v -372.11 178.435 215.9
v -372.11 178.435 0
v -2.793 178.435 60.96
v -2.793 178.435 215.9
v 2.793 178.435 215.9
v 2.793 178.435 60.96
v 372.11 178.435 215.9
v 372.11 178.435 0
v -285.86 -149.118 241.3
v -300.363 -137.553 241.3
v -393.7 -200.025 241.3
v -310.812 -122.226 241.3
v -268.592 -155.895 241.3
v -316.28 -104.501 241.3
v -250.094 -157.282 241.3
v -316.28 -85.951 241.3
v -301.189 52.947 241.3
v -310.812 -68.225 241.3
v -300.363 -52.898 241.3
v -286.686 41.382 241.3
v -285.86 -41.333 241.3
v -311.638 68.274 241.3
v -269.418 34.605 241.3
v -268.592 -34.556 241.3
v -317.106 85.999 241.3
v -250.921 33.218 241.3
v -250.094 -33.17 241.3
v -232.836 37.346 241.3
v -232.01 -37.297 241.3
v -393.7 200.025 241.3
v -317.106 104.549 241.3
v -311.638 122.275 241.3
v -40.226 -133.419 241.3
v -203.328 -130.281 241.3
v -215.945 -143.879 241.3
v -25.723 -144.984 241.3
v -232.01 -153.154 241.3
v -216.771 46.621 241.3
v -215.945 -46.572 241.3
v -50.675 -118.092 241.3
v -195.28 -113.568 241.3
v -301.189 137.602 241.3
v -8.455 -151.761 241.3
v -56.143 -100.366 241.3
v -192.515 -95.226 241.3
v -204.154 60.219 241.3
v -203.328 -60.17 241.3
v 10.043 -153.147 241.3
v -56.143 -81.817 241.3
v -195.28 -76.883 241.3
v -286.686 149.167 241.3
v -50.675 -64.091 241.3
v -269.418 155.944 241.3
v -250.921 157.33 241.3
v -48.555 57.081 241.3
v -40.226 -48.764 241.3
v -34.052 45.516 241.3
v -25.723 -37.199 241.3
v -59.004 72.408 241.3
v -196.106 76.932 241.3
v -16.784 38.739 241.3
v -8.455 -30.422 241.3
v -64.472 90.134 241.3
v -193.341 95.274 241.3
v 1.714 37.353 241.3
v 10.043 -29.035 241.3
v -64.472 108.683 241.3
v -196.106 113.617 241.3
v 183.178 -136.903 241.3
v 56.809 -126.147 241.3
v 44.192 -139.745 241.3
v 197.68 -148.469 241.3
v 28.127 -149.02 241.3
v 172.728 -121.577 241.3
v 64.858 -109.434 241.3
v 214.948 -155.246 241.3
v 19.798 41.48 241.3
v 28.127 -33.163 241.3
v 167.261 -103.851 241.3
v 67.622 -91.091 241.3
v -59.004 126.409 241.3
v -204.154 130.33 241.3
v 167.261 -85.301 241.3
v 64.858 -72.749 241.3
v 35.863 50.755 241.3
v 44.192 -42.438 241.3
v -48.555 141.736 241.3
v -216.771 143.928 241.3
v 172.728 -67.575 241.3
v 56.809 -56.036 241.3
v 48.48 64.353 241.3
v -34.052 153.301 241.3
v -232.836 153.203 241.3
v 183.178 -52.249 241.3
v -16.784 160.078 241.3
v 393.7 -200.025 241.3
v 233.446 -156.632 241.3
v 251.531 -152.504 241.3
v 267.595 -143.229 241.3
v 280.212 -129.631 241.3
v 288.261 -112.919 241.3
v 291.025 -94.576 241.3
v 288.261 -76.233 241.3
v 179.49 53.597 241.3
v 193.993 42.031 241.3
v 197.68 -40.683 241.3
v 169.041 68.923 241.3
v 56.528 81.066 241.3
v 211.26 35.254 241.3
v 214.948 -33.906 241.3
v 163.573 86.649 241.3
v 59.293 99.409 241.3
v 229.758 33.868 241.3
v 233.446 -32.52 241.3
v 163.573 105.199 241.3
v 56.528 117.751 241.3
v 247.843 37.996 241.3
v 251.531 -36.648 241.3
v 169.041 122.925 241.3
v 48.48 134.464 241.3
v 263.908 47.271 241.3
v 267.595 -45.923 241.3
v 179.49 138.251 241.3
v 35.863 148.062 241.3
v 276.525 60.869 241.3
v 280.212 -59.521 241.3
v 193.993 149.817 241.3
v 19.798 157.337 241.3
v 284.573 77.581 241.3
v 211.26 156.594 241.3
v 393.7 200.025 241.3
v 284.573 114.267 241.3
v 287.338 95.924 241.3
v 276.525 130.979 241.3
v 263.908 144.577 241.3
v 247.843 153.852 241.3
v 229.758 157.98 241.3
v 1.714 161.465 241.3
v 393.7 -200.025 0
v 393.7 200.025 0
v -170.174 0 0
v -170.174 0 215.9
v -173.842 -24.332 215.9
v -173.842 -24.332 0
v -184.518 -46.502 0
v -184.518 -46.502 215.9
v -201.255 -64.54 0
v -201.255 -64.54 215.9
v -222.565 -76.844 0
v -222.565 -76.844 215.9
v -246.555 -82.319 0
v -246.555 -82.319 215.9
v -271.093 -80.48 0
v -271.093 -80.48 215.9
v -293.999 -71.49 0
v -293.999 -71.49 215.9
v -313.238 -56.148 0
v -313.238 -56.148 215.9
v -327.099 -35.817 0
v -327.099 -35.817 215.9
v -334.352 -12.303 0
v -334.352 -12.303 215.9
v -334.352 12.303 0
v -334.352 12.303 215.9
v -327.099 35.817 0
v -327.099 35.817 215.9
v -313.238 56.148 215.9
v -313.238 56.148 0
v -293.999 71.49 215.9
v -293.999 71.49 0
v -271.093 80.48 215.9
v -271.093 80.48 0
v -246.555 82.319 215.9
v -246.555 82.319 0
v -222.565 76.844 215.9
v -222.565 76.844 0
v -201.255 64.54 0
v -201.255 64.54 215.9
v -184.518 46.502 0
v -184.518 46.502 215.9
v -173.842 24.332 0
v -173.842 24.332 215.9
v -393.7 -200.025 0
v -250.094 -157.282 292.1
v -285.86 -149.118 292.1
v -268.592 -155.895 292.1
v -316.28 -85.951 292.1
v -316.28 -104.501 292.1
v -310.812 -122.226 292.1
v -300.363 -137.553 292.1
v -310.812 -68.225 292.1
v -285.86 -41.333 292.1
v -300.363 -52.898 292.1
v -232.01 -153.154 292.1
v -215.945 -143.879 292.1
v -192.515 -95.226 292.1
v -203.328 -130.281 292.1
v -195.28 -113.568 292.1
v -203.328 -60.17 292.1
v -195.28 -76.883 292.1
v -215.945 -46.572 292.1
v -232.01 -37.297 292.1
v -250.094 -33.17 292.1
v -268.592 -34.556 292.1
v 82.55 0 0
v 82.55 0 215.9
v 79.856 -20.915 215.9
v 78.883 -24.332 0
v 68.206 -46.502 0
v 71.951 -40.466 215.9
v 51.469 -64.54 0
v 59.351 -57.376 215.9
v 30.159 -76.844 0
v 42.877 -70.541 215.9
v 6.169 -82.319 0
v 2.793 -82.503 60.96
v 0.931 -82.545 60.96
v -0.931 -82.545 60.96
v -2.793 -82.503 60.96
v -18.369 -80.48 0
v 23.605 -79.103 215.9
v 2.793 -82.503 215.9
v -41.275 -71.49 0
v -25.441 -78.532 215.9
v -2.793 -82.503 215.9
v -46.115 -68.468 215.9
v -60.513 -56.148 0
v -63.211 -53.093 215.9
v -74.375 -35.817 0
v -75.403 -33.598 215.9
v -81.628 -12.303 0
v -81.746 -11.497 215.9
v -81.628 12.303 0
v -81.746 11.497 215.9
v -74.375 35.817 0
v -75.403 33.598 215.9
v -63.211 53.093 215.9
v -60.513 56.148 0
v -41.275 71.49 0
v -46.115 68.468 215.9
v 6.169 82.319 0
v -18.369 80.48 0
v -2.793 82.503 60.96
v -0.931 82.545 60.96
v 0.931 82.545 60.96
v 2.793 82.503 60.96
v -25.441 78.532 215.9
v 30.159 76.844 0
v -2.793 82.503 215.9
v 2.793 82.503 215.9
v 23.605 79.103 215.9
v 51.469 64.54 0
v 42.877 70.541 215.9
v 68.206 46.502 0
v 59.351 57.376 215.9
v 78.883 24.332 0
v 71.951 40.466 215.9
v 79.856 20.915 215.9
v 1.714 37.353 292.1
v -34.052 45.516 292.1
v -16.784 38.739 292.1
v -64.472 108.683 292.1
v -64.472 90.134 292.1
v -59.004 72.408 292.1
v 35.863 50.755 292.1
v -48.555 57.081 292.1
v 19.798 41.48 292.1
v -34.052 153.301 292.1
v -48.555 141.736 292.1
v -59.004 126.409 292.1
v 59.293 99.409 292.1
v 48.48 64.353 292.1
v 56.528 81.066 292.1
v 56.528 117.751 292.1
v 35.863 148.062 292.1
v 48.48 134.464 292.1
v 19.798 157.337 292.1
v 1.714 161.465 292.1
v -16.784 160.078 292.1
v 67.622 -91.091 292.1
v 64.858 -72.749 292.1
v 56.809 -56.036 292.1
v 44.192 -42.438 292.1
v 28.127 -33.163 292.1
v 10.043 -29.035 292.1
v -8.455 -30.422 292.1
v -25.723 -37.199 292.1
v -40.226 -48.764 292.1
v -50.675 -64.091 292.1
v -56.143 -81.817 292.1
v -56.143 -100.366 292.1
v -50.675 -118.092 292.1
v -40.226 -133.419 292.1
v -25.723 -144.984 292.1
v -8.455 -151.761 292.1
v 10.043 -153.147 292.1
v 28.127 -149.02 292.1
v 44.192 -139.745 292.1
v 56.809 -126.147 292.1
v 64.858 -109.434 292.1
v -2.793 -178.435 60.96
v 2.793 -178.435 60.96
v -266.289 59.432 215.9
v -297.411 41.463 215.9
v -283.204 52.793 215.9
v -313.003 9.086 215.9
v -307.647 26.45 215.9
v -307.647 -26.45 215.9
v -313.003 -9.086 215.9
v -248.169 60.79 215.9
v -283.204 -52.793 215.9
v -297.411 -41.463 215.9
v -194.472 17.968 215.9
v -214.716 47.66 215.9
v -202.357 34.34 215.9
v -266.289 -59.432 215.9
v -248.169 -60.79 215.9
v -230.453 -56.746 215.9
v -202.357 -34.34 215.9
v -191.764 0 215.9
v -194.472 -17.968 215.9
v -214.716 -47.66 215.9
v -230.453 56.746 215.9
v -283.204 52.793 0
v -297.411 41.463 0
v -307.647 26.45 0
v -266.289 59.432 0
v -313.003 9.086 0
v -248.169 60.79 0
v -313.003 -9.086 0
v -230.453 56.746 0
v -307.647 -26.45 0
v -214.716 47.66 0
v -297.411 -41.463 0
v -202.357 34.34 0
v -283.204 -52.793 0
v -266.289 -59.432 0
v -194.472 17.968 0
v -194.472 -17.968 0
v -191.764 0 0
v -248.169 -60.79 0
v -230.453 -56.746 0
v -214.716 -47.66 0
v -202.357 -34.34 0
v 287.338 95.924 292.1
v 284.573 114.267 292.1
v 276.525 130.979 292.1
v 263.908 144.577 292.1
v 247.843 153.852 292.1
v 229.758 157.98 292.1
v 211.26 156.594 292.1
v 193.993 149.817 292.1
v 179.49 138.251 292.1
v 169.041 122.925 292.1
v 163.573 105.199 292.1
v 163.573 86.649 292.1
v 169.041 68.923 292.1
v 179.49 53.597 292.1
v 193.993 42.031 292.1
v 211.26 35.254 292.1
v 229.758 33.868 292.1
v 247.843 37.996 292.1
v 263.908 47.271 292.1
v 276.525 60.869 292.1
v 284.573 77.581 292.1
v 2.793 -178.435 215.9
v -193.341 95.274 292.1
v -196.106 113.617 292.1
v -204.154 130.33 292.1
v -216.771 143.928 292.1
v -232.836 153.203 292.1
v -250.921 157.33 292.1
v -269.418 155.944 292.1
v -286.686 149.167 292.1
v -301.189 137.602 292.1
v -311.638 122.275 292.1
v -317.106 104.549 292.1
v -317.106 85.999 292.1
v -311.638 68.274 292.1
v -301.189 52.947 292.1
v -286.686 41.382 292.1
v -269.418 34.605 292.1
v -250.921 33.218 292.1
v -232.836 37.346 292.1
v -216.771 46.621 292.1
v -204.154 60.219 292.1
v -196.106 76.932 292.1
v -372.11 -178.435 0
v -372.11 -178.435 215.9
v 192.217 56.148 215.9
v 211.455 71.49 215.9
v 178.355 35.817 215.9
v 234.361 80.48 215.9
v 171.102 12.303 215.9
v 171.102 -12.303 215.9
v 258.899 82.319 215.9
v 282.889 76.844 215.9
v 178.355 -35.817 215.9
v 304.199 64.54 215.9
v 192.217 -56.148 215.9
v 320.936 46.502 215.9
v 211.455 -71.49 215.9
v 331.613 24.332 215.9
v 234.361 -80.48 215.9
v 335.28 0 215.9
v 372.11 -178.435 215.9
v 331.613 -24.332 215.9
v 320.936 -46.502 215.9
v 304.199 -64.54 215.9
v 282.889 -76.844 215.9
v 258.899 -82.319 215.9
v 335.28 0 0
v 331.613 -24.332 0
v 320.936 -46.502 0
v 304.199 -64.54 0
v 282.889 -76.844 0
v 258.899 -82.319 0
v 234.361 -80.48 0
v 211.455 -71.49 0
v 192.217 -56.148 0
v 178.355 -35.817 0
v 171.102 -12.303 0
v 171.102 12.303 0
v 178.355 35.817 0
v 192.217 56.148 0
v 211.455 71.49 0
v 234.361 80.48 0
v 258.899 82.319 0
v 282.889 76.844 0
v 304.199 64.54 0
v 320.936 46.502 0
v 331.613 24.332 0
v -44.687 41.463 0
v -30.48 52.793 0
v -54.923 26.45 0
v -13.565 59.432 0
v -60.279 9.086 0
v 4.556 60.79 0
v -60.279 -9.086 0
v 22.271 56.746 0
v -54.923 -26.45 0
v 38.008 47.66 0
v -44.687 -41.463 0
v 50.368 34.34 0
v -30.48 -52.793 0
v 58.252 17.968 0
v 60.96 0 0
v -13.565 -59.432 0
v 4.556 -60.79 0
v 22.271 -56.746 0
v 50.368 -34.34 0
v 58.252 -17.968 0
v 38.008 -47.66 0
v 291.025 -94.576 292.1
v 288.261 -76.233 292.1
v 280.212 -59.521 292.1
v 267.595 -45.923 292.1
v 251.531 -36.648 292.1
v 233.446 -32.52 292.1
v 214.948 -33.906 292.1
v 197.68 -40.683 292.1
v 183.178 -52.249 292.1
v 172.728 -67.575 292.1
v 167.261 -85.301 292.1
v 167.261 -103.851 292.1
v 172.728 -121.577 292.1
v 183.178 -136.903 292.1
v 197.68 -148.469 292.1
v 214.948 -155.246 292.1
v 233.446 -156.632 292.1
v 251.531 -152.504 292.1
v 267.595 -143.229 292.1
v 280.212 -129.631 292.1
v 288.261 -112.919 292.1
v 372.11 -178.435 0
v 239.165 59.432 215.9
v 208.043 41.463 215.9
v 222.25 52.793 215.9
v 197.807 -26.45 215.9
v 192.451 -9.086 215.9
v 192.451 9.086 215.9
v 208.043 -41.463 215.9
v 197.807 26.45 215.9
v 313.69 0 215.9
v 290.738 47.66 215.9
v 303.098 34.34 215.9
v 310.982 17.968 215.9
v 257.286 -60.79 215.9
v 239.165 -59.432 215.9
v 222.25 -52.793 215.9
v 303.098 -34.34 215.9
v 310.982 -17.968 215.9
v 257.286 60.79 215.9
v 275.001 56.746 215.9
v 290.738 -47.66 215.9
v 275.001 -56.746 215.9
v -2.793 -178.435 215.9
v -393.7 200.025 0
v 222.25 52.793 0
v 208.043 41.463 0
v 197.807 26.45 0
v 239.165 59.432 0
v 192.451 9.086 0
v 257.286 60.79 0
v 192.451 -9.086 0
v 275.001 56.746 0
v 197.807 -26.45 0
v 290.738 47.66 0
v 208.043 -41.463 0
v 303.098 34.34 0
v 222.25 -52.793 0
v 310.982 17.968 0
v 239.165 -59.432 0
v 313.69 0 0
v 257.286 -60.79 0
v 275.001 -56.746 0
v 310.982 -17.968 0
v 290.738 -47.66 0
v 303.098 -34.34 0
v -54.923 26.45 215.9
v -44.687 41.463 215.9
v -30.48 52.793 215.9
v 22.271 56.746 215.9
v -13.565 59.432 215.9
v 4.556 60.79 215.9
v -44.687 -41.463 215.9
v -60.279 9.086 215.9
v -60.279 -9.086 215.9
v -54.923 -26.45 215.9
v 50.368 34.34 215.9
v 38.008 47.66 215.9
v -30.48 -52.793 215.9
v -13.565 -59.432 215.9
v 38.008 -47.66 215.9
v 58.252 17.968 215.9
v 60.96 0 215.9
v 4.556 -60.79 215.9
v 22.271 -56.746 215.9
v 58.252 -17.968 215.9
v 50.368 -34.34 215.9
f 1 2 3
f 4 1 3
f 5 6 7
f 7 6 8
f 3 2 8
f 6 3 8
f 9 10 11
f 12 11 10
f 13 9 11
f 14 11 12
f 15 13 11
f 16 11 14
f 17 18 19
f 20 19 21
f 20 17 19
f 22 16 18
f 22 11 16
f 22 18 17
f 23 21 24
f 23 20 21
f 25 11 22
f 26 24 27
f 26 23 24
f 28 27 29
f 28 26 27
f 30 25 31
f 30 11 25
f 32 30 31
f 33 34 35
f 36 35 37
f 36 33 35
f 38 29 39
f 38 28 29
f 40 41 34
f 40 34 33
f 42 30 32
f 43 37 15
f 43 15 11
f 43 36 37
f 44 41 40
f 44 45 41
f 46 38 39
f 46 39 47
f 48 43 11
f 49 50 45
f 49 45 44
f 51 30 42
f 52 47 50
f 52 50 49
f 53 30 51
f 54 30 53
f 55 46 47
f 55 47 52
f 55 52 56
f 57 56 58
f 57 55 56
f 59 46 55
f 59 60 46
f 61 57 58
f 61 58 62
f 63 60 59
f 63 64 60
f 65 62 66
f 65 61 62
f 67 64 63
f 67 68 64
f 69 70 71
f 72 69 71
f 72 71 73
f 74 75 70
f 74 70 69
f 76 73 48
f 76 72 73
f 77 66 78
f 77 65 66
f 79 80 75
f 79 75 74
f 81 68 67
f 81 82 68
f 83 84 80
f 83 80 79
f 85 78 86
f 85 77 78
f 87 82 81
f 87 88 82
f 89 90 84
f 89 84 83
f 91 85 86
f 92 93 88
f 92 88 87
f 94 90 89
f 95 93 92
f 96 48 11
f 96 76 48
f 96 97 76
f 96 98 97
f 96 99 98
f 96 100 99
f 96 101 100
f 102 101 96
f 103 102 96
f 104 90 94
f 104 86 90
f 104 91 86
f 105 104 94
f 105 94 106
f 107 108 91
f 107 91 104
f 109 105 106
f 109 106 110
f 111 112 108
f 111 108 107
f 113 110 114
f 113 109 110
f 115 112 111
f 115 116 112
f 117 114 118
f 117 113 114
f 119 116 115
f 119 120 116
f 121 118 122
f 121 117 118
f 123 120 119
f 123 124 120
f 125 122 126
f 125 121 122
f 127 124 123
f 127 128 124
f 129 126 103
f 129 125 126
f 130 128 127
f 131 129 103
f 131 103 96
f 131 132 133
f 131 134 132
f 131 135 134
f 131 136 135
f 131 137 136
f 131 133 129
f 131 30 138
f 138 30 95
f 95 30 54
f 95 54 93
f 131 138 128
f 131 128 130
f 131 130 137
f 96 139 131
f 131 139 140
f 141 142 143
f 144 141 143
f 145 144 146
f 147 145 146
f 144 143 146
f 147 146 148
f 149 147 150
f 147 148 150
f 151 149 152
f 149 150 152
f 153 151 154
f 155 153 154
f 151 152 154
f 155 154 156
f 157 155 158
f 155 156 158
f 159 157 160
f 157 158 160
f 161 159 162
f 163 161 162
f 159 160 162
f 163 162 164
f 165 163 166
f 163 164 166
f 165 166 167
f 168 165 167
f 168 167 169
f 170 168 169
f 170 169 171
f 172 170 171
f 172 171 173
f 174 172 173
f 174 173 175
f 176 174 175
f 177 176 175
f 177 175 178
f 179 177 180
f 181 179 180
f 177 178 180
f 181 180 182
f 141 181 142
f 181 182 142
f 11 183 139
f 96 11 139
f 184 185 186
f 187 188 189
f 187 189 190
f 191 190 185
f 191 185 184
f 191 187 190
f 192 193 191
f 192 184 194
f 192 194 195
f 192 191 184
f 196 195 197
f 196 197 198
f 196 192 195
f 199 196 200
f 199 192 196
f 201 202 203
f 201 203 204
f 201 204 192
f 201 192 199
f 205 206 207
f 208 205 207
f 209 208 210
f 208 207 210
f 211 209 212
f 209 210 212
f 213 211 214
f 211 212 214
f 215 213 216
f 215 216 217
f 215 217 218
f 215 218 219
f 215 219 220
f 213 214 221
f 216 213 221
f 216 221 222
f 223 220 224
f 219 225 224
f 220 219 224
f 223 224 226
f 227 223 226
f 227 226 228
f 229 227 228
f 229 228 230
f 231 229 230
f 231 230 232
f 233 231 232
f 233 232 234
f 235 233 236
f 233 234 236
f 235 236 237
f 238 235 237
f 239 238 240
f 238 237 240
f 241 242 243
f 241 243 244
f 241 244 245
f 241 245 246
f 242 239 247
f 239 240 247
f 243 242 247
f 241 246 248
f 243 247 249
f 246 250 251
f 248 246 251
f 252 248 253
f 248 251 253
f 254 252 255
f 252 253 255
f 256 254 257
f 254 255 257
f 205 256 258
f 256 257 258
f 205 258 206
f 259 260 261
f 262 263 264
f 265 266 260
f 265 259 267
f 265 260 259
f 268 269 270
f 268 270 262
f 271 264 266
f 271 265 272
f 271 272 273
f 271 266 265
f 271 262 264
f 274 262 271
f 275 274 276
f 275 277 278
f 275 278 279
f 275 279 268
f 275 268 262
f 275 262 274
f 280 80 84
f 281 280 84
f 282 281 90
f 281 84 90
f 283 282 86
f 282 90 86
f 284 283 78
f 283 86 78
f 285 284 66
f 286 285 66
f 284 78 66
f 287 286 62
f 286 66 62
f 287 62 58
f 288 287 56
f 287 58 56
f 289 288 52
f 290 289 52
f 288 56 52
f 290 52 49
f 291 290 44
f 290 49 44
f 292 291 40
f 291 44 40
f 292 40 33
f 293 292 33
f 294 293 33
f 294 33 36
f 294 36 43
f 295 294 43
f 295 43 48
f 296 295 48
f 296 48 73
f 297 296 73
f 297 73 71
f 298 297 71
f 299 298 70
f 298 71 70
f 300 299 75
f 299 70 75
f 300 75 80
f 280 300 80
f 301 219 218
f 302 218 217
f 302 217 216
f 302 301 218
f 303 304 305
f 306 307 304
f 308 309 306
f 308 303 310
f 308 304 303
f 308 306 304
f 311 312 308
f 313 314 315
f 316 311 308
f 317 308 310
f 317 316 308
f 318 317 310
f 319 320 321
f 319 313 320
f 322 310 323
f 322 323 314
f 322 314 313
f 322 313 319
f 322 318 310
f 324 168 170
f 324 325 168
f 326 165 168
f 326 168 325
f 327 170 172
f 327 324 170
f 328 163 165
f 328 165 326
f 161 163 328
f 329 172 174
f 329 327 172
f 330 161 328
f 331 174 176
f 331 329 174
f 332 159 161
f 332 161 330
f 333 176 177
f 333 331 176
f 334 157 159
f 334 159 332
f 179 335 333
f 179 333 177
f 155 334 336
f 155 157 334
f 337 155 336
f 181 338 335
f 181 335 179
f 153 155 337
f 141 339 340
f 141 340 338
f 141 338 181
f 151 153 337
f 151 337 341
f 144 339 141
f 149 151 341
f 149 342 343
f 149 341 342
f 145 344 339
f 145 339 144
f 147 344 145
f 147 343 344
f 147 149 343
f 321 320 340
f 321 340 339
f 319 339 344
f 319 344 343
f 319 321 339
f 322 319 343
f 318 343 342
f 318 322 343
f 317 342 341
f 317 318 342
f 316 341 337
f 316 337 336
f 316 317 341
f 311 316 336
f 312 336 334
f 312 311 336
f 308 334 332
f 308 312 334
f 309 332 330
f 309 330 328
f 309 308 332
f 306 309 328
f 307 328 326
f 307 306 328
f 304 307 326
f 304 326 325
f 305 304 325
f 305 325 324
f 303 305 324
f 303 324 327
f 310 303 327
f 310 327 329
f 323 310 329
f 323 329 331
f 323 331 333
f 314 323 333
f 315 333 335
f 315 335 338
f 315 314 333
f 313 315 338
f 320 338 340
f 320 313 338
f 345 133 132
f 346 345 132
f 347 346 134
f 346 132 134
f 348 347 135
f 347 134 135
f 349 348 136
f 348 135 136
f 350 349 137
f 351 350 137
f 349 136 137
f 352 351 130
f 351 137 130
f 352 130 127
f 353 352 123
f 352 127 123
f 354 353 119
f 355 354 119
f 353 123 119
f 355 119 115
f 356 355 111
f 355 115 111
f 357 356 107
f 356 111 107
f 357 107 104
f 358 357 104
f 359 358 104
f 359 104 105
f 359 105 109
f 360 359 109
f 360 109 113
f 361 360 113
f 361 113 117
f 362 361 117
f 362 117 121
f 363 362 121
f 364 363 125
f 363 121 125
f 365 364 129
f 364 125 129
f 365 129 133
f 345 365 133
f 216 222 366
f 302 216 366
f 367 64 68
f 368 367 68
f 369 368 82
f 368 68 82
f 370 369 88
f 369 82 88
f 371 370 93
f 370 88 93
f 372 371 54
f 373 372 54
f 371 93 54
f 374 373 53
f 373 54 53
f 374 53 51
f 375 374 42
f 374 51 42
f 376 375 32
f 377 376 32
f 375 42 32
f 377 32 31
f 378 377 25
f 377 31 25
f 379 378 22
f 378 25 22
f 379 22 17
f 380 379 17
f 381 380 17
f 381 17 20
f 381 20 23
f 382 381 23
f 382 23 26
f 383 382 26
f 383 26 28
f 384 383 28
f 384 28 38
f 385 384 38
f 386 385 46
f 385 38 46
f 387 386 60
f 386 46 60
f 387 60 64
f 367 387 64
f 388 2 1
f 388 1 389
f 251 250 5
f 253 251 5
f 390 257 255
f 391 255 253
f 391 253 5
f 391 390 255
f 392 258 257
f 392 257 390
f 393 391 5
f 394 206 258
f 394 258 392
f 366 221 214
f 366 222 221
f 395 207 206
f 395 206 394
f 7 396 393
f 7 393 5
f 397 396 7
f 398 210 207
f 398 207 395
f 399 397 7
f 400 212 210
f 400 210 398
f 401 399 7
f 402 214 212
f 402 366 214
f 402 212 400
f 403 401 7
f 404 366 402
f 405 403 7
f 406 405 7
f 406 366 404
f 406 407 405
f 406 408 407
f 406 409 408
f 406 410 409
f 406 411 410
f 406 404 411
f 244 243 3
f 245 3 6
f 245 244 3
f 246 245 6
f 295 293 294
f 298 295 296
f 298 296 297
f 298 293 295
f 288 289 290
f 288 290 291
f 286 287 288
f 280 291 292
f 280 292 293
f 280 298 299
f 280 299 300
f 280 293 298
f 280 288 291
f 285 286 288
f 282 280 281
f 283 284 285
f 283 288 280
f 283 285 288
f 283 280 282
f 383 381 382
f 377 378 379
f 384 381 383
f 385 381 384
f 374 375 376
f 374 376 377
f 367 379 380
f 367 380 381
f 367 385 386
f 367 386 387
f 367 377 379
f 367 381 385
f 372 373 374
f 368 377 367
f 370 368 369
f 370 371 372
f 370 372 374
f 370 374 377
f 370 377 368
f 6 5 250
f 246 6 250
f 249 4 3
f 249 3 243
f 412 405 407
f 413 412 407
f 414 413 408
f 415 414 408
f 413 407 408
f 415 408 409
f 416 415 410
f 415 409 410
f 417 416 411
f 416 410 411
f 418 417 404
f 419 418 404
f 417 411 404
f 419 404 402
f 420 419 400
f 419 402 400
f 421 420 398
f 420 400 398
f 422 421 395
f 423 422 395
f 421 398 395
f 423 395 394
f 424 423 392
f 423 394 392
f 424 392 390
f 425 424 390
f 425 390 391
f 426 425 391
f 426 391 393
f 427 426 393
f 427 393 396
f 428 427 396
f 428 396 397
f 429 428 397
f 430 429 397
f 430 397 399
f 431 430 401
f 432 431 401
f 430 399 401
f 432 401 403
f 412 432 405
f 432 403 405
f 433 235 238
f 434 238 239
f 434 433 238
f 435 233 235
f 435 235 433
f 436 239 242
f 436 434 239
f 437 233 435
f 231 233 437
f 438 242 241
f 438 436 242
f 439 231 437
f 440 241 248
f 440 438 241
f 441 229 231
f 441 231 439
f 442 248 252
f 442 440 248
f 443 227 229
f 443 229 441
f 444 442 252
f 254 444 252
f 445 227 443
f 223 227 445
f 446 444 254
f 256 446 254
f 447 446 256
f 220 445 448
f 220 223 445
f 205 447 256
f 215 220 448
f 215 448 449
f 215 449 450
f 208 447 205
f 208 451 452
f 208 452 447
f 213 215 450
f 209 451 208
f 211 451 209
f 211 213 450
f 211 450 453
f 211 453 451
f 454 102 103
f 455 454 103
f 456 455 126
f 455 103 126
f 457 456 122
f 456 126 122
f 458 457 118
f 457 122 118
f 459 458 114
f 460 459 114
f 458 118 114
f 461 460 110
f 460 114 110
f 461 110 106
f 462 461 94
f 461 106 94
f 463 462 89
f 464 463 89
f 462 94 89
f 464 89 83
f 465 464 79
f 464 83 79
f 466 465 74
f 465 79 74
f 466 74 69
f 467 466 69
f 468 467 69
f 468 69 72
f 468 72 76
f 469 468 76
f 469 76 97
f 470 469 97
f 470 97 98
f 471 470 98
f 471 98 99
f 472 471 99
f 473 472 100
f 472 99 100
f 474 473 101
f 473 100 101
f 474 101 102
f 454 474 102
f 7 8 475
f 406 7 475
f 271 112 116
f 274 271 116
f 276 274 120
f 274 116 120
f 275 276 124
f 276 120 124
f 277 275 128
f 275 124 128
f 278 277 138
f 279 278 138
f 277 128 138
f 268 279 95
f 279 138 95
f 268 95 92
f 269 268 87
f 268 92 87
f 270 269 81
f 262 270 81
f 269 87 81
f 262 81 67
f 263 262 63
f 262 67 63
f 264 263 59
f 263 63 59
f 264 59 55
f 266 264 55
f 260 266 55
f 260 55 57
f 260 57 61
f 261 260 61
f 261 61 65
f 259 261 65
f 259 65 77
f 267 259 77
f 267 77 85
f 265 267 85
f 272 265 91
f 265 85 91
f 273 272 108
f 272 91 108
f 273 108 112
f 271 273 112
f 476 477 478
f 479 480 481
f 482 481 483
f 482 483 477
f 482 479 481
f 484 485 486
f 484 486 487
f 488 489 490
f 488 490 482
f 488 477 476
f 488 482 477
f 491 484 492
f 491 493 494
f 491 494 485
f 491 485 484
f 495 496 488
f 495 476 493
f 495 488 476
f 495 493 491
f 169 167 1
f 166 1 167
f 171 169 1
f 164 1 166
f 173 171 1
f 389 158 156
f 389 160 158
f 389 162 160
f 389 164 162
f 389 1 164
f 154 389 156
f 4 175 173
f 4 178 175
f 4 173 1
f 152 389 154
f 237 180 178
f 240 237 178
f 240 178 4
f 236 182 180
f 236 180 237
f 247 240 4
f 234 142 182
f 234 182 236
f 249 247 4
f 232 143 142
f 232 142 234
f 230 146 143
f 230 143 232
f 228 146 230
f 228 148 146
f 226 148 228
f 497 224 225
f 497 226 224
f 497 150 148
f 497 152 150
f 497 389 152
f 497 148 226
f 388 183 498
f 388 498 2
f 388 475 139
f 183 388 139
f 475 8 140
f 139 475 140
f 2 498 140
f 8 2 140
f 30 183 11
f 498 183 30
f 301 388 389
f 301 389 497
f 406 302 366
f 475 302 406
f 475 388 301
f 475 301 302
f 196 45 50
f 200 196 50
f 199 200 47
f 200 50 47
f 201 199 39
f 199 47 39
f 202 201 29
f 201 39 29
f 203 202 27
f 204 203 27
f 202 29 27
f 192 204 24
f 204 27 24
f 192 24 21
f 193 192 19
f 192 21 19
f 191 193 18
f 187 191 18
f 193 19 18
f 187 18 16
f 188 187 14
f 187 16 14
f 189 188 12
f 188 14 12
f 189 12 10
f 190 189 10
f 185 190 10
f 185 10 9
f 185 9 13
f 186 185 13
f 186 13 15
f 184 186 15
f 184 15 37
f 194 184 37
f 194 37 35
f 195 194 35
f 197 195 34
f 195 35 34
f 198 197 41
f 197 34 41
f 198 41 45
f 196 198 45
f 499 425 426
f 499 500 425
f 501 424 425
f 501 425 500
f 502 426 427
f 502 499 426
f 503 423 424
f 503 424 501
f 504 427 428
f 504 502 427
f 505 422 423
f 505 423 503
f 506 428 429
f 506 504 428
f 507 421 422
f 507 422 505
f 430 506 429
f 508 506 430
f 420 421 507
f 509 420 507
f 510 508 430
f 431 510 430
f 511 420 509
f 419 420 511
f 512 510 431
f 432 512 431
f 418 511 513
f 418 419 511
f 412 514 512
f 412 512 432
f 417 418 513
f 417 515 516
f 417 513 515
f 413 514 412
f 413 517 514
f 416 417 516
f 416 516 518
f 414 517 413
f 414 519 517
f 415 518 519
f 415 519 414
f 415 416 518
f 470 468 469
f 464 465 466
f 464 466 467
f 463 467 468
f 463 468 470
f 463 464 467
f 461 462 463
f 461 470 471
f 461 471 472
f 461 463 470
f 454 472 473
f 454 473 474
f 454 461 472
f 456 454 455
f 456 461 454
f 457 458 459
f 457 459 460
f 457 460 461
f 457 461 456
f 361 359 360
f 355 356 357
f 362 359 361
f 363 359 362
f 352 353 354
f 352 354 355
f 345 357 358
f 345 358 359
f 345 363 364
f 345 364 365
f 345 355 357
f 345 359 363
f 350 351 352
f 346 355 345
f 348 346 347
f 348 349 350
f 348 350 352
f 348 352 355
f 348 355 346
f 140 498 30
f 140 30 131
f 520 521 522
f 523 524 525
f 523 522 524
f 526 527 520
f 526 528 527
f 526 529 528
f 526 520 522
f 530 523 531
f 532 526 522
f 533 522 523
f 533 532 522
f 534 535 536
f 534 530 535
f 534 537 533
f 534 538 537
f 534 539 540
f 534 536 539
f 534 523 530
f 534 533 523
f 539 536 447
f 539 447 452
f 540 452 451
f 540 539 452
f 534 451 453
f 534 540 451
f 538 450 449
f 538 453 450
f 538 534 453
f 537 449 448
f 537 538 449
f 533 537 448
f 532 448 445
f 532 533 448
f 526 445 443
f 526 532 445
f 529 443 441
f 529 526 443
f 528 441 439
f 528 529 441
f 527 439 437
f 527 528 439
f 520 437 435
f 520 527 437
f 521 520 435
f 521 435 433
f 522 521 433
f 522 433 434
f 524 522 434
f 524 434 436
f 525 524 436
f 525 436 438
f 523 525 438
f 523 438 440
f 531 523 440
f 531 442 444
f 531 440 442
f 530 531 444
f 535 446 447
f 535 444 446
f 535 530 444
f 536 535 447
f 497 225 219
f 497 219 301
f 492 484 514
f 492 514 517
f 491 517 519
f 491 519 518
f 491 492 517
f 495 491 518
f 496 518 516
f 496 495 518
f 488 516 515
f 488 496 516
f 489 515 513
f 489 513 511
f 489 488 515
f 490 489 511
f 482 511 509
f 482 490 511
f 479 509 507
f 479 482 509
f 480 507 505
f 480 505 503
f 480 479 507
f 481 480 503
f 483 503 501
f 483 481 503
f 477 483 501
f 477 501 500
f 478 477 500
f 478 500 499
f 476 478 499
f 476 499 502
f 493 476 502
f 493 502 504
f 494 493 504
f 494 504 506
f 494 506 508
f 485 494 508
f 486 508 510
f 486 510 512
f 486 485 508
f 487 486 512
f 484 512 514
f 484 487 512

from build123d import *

# Parameters (mm, degrees)
F0_W      = 787.4
F0_H      = 400.05
F1_DEPTH  = 241.3
F2_R      = 62.23
F3_DEPTH  = 50.8
F4_W      = 744.22
F4_H      = 356.87
F5_DEPTH  = 215.9
F6_R      = 82.55
F6_R_2    = 60.96
F7_DEPTH  = 215.9
F8_W      = 5.5862860754
F8_H      = 356.87
F9_DEPTH  = 154.94
F10_DEPTH = 254
F11_DEPTH = 154.94


with BuildPart() as f1:
    # F0 (on Top) → F1 (new body)
    with BuildSketch(Plane.XY):
        Rectangle(F0_W, F0_H)
    extrude(amount=F1_DEPTH)

    # F2 (on face) → F3 (join)
    with BuildSketch(Plane.XY.offset(241.3)):
        with Locations((-254.7448580774, -95.225625706)):
            Circle(F2_R)
        with Locations((-255.5709736083, 95.274374294)):
            Circle(F2_R)
        with Locations((-2.9369472516, 99.4085264267)):
            Circle(F2_R)
        with Locations((5.3922456924, -91.0914735733)):
            Circle(F2_R)
        with Locations((225.107953531, 95.9239800905)):
            Circle(F2_R)
        with Locations((228.7954458169, -94.5760199095)):
            Circle(F2_R)
    extrude(amount=F3_DEPTH)

    # F4 (on face) → F5 (cut)
    with BuildSketch(Plane(origin=(0, 0, 0), x_dir=(1, 0, 0), z_dir=(0, 0, -1))):
        Rectangle(F4_W, F4_H)
    extrude(amount=-F5_DEPTH, mode=Mode.SUBTRACT)

    # F6 (on face) → F7 (join)
    with BuildSketch(Plane(origin=(0, 0, 215.9), x_dir=(1, 0, 0), z_dir=(0, 0, -1))):
        with Locations((-252.7241706848, 0)):
            Circle(F6_R)
        with Locations((-252.7241706848, 0)):
            Circle(F6_R_2, mode=Mode.SUBTRACT)
        Circle(F6_R)
        Circle(F6_R_2, mode=Mode.SUBTRACT)
        with Locations((252.73, 0)):
            Circle(F6_R)
        with Locations((252.73, 0)):
            Circle(F6_R_2, mode=Mode.SUBTRACT)
    extrude(amount=F7_DEPTH)

    # F8 (on face) → F9 (join)
    with BuildSketch(Plane(origin=(0, 0, 215.9), x_dir=(1, 0, 0), z_dir=(0, 0, -1))):
        Rectangle(F8_W, F8_H)
    extrude(amount=F9_DEPTH)

    # F10 (cut): faces of the model
    f10_faces = [f1.faces().sort_by_distance(p)[0] for p in [
        (-27.3880241928, 0, 215.9),
        (27.3880241928, 0, 215.9),
    ]]
    extrude(f10_faces, amount=F10_DEPTH, mode=Mode.SUBTRACT)

    # F11 (cut): a face of the model
    f11_faces = [f1.faces().sort_by_distance(p)[0] for p in [
        (0, 0, 60.96),
    ]]
    extrude(f11_faces, amount=-F11_DEPTH, mode=Mode.SUBTRACT)


solid = f1.part
